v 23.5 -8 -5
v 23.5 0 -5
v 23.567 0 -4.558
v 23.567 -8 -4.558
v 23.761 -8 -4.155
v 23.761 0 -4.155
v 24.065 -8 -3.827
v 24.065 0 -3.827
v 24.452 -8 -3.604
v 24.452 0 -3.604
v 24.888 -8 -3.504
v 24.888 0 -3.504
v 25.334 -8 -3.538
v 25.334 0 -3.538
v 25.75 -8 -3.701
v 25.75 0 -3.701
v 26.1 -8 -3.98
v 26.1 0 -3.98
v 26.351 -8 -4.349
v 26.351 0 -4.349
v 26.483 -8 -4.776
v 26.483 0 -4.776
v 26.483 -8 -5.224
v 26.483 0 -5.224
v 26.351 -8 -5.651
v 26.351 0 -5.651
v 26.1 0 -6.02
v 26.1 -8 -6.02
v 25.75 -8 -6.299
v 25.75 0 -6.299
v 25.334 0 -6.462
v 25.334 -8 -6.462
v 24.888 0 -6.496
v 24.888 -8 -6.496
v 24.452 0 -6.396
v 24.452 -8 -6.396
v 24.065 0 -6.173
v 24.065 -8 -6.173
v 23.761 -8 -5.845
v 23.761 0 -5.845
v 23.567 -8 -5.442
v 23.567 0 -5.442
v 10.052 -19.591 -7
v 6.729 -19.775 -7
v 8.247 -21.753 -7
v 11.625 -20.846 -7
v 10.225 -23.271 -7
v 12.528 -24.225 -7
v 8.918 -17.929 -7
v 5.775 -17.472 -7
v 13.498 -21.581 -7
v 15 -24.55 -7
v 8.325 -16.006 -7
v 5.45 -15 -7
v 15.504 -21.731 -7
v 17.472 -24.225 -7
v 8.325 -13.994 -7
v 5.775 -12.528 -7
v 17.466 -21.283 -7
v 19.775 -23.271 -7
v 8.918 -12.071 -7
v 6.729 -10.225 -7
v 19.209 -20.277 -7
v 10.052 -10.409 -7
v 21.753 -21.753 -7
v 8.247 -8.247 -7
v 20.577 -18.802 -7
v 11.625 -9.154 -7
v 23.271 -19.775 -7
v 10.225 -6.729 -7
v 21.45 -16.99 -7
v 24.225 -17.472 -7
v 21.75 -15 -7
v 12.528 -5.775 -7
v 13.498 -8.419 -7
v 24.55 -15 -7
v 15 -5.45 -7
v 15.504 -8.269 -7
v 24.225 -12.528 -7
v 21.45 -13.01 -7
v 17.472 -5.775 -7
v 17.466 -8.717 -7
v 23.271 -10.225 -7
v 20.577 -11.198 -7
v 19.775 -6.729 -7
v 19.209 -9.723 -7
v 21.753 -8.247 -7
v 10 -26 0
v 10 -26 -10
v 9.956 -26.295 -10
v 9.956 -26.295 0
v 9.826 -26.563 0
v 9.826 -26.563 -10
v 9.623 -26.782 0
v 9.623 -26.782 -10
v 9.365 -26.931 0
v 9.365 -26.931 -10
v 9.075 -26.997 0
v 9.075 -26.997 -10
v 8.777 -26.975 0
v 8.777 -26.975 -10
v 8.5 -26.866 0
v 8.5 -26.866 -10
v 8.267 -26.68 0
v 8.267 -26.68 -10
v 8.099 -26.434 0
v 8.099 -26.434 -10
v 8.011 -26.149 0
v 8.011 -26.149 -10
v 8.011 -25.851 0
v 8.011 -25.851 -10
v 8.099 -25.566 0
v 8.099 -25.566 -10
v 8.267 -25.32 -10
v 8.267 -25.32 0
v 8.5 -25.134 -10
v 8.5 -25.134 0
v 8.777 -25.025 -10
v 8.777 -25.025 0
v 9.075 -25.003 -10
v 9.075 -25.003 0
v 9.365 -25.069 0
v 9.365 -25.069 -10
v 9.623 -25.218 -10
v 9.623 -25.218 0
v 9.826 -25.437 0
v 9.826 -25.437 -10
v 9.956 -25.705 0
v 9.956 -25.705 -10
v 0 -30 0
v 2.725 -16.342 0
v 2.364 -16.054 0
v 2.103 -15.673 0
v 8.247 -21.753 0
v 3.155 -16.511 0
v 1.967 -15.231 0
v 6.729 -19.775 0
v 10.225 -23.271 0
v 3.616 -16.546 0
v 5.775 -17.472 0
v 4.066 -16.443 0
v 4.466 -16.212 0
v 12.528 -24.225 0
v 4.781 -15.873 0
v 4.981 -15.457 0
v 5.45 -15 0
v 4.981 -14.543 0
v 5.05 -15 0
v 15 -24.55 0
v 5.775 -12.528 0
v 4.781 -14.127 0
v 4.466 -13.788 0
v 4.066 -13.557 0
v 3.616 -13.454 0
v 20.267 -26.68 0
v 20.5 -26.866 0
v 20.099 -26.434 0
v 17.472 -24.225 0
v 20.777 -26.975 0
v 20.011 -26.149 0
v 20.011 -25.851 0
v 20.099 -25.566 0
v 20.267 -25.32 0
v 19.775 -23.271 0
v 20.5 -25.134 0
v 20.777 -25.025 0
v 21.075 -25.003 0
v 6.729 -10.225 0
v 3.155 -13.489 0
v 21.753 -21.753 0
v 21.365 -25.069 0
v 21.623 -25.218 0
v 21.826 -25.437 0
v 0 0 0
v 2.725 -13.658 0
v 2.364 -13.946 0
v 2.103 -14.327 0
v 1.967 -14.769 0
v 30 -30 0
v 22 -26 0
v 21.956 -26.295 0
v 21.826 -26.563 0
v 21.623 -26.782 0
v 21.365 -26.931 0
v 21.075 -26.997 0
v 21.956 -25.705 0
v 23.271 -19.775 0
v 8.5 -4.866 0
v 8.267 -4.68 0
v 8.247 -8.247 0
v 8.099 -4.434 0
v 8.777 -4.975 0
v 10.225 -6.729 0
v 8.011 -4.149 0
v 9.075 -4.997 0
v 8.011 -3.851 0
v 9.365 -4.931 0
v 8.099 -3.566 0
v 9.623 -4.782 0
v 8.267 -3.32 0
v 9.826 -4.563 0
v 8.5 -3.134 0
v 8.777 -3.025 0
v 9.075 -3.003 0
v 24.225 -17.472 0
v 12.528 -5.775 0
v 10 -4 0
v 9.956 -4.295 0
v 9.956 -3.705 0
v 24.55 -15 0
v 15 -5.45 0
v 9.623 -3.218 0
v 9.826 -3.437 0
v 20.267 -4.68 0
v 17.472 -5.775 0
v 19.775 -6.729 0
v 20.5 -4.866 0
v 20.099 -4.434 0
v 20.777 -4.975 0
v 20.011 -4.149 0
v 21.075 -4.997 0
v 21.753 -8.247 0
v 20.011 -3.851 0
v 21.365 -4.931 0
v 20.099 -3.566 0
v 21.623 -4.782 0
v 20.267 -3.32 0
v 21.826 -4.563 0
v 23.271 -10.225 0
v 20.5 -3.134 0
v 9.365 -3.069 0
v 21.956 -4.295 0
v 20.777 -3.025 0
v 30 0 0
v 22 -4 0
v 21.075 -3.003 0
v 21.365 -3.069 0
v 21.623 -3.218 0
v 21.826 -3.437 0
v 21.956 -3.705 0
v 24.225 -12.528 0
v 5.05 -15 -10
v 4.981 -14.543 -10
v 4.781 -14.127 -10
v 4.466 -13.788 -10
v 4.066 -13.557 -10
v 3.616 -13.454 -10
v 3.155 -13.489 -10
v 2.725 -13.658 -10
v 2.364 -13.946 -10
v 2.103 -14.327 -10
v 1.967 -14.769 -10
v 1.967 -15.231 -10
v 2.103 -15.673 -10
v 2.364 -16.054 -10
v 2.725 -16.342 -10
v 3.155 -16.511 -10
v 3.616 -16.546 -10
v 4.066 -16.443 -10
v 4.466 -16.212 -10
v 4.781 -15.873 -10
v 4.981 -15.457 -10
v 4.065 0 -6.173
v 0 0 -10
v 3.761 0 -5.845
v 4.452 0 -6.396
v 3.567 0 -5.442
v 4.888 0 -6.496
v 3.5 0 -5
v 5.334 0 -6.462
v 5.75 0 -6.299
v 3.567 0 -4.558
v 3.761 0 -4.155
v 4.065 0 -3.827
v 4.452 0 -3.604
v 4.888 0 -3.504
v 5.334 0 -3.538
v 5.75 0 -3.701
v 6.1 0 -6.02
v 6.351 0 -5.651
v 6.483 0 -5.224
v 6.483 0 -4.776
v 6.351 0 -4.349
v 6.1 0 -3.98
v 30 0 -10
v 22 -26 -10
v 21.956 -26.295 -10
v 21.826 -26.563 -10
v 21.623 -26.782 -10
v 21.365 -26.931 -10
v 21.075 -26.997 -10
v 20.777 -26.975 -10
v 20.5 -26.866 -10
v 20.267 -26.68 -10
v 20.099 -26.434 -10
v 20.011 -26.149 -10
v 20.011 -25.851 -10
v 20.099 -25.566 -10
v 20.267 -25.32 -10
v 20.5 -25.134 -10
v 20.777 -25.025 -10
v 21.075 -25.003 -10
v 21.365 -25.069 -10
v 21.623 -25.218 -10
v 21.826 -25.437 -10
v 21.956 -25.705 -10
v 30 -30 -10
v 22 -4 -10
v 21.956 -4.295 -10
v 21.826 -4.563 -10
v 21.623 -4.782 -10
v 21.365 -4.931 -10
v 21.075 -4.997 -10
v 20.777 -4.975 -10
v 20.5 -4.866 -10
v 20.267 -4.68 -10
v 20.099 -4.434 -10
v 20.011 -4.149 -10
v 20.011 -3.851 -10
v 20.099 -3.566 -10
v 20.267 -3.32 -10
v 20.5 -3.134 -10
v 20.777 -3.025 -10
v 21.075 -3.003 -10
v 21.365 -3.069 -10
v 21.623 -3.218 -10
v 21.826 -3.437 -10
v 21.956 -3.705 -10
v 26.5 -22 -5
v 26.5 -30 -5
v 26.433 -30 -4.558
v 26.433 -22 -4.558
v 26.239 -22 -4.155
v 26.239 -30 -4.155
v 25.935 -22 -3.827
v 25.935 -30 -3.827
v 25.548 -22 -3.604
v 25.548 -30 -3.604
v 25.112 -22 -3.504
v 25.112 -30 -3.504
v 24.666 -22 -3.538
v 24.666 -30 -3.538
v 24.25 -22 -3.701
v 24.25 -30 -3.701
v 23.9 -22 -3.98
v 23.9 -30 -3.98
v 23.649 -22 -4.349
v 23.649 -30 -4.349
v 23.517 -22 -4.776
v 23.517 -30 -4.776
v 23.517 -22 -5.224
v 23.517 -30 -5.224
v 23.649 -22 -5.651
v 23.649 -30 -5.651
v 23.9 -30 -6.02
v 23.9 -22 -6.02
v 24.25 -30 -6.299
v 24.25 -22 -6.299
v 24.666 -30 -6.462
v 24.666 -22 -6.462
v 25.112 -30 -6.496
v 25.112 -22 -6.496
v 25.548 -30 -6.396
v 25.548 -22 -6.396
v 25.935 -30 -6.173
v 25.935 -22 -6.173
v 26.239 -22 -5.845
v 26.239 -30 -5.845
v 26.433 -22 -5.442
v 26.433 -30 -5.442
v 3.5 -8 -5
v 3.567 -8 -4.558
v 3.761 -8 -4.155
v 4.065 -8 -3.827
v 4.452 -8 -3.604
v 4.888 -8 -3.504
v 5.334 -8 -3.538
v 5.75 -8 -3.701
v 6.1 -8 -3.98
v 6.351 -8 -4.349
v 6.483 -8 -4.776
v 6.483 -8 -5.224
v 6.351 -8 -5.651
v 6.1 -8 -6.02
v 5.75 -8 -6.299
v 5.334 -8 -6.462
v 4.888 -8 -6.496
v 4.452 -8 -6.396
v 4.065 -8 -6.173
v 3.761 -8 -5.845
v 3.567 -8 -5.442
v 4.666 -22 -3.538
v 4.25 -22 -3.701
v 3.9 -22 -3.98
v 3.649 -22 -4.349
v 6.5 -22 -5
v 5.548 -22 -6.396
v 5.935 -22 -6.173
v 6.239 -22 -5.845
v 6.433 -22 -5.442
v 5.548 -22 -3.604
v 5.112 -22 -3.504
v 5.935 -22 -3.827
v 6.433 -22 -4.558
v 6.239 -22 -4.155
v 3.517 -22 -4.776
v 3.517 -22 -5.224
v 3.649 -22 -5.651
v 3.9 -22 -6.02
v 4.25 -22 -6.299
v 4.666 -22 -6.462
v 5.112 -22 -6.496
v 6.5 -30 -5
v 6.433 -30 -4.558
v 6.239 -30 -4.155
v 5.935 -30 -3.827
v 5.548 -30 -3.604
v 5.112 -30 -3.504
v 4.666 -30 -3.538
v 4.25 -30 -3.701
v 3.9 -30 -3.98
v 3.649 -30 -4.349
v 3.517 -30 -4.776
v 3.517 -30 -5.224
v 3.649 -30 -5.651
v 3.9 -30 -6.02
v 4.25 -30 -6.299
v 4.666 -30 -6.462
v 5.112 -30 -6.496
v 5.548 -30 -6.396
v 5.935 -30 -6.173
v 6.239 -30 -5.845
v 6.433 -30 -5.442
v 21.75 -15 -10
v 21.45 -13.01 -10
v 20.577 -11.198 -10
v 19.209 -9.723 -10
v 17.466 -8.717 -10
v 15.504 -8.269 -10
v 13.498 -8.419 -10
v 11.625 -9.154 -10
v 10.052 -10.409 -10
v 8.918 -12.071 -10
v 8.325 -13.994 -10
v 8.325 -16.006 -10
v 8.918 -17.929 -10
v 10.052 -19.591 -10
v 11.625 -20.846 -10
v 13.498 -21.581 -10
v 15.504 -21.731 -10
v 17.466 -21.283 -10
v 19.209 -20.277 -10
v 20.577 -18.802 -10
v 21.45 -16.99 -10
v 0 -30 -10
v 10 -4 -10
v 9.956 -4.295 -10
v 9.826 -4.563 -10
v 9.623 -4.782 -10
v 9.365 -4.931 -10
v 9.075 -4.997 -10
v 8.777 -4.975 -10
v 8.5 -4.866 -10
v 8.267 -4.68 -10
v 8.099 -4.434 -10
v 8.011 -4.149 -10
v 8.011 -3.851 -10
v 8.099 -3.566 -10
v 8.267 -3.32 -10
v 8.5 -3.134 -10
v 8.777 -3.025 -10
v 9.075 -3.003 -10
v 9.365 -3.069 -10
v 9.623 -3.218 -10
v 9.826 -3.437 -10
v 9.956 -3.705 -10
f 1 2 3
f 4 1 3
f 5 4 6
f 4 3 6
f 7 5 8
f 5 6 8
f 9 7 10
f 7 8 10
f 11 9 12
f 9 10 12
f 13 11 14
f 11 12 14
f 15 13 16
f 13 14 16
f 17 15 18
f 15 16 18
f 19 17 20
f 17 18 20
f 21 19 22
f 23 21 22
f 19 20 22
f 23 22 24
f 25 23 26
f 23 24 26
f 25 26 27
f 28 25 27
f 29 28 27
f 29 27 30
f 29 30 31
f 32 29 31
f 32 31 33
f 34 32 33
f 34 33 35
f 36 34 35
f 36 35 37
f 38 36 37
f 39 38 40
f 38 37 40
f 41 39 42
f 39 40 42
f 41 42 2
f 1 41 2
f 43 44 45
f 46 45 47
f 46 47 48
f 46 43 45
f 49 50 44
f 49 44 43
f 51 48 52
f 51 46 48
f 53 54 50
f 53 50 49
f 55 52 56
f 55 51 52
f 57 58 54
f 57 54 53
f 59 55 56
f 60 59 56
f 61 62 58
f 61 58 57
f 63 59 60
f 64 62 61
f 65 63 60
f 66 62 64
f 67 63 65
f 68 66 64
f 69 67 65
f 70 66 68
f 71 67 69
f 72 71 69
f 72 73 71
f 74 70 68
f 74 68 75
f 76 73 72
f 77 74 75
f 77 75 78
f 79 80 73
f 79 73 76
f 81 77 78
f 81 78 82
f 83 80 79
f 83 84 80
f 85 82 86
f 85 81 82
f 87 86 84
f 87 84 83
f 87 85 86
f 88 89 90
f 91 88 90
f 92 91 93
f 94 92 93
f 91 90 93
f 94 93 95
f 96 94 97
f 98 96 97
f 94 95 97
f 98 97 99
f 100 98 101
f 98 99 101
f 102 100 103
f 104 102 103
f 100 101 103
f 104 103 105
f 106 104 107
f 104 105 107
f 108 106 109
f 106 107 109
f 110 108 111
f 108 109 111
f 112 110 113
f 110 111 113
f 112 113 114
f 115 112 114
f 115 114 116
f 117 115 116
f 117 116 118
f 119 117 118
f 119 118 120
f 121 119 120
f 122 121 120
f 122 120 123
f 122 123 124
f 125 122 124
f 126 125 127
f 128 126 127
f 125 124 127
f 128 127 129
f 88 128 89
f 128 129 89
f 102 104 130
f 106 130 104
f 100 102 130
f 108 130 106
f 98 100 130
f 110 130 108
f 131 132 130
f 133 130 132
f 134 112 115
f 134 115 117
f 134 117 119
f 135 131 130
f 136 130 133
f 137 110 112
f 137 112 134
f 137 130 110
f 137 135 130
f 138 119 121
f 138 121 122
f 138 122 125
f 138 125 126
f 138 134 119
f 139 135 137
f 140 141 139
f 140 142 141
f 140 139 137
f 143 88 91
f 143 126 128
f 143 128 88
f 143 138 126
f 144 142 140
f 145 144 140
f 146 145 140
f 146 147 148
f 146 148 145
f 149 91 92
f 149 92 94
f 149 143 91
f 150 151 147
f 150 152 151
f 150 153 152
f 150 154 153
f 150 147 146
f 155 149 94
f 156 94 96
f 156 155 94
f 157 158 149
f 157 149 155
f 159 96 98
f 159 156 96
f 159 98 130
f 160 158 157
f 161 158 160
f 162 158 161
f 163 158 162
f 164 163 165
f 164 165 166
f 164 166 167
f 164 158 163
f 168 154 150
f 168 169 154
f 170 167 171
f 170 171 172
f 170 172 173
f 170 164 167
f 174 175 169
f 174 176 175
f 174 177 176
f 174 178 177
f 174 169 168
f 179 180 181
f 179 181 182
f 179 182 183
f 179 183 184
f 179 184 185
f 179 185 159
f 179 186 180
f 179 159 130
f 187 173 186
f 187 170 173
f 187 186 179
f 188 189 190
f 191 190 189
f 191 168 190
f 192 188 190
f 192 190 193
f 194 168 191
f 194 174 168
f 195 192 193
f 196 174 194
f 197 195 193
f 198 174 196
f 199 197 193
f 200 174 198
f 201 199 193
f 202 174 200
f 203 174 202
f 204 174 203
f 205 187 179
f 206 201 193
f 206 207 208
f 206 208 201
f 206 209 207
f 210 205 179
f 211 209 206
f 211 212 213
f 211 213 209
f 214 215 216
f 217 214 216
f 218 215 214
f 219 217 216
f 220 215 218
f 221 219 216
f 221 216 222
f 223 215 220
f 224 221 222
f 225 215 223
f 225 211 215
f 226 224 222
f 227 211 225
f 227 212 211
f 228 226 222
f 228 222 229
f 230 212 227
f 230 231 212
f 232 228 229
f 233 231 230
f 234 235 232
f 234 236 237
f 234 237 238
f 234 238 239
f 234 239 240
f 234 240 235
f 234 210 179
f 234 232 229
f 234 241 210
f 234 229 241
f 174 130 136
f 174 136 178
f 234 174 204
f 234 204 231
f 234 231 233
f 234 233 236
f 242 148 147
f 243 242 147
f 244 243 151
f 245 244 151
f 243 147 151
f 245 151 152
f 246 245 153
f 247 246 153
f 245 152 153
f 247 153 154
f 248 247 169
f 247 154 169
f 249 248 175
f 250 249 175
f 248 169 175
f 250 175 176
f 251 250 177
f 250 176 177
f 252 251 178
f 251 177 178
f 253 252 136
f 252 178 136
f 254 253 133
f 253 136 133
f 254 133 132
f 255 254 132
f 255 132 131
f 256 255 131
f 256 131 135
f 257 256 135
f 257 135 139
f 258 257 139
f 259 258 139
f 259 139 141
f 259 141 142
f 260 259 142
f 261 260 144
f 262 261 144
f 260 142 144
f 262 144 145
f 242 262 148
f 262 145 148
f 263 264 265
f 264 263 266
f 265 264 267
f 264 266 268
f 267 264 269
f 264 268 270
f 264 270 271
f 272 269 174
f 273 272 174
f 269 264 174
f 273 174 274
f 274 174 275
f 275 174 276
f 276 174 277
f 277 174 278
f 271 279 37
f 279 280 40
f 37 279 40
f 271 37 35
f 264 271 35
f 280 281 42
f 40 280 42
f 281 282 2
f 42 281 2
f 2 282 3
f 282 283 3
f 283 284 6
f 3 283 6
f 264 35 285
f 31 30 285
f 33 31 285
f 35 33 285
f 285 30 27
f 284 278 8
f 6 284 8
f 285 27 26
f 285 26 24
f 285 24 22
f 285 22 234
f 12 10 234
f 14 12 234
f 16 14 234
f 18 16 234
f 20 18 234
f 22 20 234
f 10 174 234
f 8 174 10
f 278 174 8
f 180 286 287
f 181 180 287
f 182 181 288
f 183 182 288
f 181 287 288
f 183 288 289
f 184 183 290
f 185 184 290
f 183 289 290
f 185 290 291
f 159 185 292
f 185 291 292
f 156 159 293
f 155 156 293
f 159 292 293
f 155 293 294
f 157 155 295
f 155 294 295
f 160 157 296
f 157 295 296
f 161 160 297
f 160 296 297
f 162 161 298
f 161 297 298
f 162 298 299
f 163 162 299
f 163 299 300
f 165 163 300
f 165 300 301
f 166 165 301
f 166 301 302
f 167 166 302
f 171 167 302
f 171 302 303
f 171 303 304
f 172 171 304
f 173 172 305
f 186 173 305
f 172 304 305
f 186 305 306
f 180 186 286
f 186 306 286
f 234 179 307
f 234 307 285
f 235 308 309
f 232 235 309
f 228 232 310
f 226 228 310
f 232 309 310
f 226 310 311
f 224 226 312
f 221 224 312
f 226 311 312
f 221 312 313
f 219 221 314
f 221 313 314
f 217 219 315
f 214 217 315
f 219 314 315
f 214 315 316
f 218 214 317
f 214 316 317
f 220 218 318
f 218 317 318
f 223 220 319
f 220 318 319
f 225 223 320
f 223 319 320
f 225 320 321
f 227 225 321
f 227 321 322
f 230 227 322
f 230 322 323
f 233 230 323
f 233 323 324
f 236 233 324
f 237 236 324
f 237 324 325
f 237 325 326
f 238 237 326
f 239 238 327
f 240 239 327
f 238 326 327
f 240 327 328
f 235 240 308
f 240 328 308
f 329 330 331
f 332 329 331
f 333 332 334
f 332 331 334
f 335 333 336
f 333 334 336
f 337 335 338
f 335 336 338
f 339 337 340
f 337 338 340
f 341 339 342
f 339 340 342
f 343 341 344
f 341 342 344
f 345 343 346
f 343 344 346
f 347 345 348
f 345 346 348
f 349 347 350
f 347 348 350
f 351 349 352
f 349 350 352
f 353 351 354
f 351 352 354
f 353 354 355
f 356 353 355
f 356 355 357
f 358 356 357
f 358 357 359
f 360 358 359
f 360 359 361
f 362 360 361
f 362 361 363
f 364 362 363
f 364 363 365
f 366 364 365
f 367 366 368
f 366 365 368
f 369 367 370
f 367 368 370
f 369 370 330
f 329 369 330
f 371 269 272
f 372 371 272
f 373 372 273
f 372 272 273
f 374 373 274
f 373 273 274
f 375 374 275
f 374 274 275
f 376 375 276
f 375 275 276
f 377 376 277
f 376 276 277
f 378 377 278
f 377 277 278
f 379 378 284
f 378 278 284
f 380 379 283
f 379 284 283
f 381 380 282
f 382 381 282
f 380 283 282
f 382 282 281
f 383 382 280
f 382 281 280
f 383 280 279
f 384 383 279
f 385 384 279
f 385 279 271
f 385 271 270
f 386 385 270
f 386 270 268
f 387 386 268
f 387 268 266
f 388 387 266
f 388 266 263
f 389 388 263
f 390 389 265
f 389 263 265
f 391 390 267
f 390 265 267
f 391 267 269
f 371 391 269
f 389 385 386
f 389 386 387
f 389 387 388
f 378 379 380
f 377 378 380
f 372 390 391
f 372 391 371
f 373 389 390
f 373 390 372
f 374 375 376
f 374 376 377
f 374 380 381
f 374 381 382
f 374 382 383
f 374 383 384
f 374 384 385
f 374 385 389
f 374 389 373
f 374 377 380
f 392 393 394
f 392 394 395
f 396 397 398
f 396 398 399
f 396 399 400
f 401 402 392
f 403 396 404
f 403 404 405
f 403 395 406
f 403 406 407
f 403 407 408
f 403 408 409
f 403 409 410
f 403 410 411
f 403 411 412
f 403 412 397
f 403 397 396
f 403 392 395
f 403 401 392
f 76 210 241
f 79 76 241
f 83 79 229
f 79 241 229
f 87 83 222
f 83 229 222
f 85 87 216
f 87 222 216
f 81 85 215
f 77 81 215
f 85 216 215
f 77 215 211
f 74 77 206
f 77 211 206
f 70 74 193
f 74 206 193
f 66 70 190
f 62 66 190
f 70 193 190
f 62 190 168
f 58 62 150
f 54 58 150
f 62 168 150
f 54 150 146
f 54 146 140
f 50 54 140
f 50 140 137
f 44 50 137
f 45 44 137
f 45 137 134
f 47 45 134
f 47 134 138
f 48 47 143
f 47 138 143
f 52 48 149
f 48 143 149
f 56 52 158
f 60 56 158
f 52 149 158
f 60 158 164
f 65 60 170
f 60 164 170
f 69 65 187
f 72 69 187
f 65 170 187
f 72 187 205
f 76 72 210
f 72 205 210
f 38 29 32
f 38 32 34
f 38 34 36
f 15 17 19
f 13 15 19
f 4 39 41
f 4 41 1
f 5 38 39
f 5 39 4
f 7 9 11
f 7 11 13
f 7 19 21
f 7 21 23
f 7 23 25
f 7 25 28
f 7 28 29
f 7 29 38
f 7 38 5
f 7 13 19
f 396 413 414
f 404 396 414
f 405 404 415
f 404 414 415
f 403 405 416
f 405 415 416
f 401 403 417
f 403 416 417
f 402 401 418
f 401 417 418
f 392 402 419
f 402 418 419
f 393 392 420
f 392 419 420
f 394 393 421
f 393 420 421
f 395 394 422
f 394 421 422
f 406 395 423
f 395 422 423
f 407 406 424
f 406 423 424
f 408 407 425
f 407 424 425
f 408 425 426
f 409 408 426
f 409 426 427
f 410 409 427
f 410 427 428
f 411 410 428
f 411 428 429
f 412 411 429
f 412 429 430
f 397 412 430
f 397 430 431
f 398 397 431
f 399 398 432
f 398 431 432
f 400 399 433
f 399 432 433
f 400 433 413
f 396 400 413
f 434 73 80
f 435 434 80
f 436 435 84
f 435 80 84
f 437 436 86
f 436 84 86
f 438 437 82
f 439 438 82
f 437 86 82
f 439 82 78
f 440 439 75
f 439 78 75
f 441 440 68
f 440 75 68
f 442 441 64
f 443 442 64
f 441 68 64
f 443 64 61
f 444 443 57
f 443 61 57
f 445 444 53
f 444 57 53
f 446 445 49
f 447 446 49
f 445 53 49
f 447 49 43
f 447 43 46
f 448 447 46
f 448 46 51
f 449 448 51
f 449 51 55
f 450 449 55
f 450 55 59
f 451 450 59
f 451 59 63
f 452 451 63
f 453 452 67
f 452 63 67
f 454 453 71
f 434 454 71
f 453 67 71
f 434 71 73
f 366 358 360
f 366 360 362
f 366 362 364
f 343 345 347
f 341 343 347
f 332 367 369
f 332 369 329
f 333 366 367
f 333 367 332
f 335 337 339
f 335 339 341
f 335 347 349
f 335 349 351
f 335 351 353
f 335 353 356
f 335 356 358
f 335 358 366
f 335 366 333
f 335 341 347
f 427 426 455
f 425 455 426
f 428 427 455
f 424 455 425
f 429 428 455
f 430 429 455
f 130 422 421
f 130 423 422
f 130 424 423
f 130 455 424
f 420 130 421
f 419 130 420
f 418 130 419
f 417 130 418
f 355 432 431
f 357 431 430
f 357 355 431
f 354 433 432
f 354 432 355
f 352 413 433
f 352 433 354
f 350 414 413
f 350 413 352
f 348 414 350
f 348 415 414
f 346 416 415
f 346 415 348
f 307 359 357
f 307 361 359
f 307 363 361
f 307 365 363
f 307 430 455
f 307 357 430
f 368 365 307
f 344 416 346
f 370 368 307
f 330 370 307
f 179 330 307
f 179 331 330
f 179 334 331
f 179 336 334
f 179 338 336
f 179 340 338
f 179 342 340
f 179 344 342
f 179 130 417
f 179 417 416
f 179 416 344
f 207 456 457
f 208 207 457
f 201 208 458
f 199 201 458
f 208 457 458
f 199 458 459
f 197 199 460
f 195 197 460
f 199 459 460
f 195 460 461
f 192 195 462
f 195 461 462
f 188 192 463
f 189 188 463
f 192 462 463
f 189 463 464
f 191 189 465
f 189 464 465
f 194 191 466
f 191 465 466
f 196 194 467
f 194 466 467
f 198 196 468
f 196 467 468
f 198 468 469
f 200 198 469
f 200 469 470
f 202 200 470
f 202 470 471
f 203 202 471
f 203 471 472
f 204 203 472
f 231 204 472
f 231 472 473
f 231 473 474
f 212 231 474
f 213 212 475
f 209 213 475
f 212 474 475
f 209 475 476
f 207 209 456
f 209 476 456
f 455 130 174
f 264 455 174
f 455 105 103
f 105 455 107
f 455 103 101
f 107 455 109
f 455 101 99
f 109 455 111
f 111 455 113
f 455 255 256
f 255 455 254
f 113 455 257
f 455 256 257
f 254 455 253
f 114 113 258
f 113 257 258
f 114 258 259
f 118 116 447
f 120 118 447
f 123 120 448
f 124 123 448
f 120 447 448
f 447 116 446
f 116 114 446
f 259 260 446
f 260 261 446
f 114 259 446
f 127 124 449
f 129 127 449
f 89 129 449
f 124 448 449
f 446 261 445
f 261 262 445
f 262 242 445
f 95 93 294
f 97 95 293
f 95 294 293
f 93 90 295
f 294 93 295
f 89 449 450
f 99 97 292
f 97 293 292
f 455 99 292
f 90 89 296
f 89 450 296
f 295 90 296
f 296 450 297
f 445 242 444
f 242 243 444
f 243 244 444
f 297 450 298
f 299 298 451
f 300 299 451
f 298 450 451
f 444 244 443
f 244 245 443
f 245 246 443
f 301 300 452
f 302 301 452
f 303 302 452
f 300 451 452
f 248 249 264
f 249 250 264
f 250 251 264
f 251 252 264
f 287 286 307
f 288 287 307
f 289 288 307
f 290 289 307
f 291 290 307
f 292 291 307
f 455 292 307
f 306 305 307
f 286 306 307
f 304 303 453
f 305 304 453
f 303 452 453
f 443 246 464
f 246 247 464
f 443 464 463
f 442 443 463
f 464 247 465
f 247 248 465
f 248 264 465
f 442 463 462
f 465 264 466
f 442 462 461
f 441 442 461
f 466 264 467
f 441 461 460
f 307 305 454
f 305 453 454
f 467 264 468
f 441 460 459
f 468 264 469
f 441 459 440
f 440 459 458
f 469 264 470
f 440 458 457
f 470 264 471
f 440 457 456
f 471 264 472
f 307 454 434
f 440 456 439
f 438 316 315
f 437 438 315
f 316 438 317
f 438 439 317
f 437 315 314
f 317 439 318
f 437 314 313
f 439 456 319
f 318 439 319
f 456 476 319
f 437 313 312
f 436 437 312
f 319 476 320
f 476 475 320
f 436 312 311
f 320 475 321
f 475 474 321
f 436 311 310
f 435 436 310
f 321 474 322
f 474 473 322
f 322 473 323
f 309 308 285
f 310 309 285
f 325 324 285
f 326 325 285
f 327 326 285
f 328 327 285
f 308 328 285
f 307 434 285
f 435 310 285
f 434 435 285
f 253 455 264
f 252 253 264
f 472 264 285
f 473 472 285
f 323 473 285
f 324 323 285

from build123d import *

# Parameters (mm, degrees)
F0_W      = 30
F0_H      = 30
F1_DEPTH  = 10
F2_R      = 9.55
F3_DEPTH  = 7
F4_R      = 6.75
F5_DEPTH  = 3
F7_DEPTH  = 10
F8_R      = 1.5
F9_DEPTH  = 8
F10_R     = 1.5
F11_DEPTH = 8
F12_R     = 1
F13_DEPTH = 10


with BuildPart() as f1:
    # F0 (on Top) → F1 (new body)
    with BuildSketch(Plane.XY):
        with Locations((15, -15)):
            Rectangle(F0_W, F0_H)
    extrude(amount=-F1_DEPTH)

    # F2 (on face) → F3 (cut)
    with BuildSketch(Plane.XY):
        with Locations((15, -15)):
            Circle(F2_R)
    extrude(amount=-F3_DEPTH, mode=Mode.SUBTRACT)

    # F4 (on face) → F5 (cut, through all)
    with BuildSketch(Plane.XY.offset(-7)):
        with Locations((15, -15)):
            Circle(F4_R)
    extrude(amount=-F5_DEPTH, mode=Mode.SUBTRACT)

    # F6 (on face) → F7 (cut, through all)
    with BuildSketch(Plane.XY):
        with BuildLine():
            ThreePointArc((1.95, -15), (3.5, -16.55), (5.05, -15))
            ThreePointArc((5.05, -15), (3.5, -13.45), (1.95, -15))
        make_face()
    extrude(amount=-F7_DEPTH, mode=Mode.SUBTRACT)

    # F8 (on face) → F9 (cut)
    with BuildSketch(Plane.XZ.offset(30)):
        with Locations((5, -5)):
            Circle(F8_R)
        with Locations((25, -5)):
            Circle(F8_R)
    extrude(amount=-F9_DEPTH, mode=Mode.SUBTRACT)

    # F10 (on face) → F11 (cut)
    with BuildSketch(Plane(origin=(0, 0, 0), x_dir=(-1, 0, 0), z_dir=(0, 1, 0))):
        with Locations((-25, -5)):
            Circle(F10_R)
        with Locations((-5, -5)):
            Circle(F10_R)
    extrude(amount=-F11_DEPTH, mode=Mode.SUBTRACT)

    # F12 (on face) → F13 (cut, through all)
    with BuildSketch(Plane(origin=(0, 0, -10), x_dir=(1, 0, 0), z_dir=(0, 0, -1))):
        with Locations((9, 4)):
            Circle(F12_R)
        with Locations((21, 4)):
            Circle(F12_R)
        with Locations((21, 26)):
            Circle(F12_R)
        with Locations((9, 26)):
            Circle(F12_R)
    extrude(amount=-F13_DEPTH, mode=Mode.SUBTRACT)


solid = f1.part
